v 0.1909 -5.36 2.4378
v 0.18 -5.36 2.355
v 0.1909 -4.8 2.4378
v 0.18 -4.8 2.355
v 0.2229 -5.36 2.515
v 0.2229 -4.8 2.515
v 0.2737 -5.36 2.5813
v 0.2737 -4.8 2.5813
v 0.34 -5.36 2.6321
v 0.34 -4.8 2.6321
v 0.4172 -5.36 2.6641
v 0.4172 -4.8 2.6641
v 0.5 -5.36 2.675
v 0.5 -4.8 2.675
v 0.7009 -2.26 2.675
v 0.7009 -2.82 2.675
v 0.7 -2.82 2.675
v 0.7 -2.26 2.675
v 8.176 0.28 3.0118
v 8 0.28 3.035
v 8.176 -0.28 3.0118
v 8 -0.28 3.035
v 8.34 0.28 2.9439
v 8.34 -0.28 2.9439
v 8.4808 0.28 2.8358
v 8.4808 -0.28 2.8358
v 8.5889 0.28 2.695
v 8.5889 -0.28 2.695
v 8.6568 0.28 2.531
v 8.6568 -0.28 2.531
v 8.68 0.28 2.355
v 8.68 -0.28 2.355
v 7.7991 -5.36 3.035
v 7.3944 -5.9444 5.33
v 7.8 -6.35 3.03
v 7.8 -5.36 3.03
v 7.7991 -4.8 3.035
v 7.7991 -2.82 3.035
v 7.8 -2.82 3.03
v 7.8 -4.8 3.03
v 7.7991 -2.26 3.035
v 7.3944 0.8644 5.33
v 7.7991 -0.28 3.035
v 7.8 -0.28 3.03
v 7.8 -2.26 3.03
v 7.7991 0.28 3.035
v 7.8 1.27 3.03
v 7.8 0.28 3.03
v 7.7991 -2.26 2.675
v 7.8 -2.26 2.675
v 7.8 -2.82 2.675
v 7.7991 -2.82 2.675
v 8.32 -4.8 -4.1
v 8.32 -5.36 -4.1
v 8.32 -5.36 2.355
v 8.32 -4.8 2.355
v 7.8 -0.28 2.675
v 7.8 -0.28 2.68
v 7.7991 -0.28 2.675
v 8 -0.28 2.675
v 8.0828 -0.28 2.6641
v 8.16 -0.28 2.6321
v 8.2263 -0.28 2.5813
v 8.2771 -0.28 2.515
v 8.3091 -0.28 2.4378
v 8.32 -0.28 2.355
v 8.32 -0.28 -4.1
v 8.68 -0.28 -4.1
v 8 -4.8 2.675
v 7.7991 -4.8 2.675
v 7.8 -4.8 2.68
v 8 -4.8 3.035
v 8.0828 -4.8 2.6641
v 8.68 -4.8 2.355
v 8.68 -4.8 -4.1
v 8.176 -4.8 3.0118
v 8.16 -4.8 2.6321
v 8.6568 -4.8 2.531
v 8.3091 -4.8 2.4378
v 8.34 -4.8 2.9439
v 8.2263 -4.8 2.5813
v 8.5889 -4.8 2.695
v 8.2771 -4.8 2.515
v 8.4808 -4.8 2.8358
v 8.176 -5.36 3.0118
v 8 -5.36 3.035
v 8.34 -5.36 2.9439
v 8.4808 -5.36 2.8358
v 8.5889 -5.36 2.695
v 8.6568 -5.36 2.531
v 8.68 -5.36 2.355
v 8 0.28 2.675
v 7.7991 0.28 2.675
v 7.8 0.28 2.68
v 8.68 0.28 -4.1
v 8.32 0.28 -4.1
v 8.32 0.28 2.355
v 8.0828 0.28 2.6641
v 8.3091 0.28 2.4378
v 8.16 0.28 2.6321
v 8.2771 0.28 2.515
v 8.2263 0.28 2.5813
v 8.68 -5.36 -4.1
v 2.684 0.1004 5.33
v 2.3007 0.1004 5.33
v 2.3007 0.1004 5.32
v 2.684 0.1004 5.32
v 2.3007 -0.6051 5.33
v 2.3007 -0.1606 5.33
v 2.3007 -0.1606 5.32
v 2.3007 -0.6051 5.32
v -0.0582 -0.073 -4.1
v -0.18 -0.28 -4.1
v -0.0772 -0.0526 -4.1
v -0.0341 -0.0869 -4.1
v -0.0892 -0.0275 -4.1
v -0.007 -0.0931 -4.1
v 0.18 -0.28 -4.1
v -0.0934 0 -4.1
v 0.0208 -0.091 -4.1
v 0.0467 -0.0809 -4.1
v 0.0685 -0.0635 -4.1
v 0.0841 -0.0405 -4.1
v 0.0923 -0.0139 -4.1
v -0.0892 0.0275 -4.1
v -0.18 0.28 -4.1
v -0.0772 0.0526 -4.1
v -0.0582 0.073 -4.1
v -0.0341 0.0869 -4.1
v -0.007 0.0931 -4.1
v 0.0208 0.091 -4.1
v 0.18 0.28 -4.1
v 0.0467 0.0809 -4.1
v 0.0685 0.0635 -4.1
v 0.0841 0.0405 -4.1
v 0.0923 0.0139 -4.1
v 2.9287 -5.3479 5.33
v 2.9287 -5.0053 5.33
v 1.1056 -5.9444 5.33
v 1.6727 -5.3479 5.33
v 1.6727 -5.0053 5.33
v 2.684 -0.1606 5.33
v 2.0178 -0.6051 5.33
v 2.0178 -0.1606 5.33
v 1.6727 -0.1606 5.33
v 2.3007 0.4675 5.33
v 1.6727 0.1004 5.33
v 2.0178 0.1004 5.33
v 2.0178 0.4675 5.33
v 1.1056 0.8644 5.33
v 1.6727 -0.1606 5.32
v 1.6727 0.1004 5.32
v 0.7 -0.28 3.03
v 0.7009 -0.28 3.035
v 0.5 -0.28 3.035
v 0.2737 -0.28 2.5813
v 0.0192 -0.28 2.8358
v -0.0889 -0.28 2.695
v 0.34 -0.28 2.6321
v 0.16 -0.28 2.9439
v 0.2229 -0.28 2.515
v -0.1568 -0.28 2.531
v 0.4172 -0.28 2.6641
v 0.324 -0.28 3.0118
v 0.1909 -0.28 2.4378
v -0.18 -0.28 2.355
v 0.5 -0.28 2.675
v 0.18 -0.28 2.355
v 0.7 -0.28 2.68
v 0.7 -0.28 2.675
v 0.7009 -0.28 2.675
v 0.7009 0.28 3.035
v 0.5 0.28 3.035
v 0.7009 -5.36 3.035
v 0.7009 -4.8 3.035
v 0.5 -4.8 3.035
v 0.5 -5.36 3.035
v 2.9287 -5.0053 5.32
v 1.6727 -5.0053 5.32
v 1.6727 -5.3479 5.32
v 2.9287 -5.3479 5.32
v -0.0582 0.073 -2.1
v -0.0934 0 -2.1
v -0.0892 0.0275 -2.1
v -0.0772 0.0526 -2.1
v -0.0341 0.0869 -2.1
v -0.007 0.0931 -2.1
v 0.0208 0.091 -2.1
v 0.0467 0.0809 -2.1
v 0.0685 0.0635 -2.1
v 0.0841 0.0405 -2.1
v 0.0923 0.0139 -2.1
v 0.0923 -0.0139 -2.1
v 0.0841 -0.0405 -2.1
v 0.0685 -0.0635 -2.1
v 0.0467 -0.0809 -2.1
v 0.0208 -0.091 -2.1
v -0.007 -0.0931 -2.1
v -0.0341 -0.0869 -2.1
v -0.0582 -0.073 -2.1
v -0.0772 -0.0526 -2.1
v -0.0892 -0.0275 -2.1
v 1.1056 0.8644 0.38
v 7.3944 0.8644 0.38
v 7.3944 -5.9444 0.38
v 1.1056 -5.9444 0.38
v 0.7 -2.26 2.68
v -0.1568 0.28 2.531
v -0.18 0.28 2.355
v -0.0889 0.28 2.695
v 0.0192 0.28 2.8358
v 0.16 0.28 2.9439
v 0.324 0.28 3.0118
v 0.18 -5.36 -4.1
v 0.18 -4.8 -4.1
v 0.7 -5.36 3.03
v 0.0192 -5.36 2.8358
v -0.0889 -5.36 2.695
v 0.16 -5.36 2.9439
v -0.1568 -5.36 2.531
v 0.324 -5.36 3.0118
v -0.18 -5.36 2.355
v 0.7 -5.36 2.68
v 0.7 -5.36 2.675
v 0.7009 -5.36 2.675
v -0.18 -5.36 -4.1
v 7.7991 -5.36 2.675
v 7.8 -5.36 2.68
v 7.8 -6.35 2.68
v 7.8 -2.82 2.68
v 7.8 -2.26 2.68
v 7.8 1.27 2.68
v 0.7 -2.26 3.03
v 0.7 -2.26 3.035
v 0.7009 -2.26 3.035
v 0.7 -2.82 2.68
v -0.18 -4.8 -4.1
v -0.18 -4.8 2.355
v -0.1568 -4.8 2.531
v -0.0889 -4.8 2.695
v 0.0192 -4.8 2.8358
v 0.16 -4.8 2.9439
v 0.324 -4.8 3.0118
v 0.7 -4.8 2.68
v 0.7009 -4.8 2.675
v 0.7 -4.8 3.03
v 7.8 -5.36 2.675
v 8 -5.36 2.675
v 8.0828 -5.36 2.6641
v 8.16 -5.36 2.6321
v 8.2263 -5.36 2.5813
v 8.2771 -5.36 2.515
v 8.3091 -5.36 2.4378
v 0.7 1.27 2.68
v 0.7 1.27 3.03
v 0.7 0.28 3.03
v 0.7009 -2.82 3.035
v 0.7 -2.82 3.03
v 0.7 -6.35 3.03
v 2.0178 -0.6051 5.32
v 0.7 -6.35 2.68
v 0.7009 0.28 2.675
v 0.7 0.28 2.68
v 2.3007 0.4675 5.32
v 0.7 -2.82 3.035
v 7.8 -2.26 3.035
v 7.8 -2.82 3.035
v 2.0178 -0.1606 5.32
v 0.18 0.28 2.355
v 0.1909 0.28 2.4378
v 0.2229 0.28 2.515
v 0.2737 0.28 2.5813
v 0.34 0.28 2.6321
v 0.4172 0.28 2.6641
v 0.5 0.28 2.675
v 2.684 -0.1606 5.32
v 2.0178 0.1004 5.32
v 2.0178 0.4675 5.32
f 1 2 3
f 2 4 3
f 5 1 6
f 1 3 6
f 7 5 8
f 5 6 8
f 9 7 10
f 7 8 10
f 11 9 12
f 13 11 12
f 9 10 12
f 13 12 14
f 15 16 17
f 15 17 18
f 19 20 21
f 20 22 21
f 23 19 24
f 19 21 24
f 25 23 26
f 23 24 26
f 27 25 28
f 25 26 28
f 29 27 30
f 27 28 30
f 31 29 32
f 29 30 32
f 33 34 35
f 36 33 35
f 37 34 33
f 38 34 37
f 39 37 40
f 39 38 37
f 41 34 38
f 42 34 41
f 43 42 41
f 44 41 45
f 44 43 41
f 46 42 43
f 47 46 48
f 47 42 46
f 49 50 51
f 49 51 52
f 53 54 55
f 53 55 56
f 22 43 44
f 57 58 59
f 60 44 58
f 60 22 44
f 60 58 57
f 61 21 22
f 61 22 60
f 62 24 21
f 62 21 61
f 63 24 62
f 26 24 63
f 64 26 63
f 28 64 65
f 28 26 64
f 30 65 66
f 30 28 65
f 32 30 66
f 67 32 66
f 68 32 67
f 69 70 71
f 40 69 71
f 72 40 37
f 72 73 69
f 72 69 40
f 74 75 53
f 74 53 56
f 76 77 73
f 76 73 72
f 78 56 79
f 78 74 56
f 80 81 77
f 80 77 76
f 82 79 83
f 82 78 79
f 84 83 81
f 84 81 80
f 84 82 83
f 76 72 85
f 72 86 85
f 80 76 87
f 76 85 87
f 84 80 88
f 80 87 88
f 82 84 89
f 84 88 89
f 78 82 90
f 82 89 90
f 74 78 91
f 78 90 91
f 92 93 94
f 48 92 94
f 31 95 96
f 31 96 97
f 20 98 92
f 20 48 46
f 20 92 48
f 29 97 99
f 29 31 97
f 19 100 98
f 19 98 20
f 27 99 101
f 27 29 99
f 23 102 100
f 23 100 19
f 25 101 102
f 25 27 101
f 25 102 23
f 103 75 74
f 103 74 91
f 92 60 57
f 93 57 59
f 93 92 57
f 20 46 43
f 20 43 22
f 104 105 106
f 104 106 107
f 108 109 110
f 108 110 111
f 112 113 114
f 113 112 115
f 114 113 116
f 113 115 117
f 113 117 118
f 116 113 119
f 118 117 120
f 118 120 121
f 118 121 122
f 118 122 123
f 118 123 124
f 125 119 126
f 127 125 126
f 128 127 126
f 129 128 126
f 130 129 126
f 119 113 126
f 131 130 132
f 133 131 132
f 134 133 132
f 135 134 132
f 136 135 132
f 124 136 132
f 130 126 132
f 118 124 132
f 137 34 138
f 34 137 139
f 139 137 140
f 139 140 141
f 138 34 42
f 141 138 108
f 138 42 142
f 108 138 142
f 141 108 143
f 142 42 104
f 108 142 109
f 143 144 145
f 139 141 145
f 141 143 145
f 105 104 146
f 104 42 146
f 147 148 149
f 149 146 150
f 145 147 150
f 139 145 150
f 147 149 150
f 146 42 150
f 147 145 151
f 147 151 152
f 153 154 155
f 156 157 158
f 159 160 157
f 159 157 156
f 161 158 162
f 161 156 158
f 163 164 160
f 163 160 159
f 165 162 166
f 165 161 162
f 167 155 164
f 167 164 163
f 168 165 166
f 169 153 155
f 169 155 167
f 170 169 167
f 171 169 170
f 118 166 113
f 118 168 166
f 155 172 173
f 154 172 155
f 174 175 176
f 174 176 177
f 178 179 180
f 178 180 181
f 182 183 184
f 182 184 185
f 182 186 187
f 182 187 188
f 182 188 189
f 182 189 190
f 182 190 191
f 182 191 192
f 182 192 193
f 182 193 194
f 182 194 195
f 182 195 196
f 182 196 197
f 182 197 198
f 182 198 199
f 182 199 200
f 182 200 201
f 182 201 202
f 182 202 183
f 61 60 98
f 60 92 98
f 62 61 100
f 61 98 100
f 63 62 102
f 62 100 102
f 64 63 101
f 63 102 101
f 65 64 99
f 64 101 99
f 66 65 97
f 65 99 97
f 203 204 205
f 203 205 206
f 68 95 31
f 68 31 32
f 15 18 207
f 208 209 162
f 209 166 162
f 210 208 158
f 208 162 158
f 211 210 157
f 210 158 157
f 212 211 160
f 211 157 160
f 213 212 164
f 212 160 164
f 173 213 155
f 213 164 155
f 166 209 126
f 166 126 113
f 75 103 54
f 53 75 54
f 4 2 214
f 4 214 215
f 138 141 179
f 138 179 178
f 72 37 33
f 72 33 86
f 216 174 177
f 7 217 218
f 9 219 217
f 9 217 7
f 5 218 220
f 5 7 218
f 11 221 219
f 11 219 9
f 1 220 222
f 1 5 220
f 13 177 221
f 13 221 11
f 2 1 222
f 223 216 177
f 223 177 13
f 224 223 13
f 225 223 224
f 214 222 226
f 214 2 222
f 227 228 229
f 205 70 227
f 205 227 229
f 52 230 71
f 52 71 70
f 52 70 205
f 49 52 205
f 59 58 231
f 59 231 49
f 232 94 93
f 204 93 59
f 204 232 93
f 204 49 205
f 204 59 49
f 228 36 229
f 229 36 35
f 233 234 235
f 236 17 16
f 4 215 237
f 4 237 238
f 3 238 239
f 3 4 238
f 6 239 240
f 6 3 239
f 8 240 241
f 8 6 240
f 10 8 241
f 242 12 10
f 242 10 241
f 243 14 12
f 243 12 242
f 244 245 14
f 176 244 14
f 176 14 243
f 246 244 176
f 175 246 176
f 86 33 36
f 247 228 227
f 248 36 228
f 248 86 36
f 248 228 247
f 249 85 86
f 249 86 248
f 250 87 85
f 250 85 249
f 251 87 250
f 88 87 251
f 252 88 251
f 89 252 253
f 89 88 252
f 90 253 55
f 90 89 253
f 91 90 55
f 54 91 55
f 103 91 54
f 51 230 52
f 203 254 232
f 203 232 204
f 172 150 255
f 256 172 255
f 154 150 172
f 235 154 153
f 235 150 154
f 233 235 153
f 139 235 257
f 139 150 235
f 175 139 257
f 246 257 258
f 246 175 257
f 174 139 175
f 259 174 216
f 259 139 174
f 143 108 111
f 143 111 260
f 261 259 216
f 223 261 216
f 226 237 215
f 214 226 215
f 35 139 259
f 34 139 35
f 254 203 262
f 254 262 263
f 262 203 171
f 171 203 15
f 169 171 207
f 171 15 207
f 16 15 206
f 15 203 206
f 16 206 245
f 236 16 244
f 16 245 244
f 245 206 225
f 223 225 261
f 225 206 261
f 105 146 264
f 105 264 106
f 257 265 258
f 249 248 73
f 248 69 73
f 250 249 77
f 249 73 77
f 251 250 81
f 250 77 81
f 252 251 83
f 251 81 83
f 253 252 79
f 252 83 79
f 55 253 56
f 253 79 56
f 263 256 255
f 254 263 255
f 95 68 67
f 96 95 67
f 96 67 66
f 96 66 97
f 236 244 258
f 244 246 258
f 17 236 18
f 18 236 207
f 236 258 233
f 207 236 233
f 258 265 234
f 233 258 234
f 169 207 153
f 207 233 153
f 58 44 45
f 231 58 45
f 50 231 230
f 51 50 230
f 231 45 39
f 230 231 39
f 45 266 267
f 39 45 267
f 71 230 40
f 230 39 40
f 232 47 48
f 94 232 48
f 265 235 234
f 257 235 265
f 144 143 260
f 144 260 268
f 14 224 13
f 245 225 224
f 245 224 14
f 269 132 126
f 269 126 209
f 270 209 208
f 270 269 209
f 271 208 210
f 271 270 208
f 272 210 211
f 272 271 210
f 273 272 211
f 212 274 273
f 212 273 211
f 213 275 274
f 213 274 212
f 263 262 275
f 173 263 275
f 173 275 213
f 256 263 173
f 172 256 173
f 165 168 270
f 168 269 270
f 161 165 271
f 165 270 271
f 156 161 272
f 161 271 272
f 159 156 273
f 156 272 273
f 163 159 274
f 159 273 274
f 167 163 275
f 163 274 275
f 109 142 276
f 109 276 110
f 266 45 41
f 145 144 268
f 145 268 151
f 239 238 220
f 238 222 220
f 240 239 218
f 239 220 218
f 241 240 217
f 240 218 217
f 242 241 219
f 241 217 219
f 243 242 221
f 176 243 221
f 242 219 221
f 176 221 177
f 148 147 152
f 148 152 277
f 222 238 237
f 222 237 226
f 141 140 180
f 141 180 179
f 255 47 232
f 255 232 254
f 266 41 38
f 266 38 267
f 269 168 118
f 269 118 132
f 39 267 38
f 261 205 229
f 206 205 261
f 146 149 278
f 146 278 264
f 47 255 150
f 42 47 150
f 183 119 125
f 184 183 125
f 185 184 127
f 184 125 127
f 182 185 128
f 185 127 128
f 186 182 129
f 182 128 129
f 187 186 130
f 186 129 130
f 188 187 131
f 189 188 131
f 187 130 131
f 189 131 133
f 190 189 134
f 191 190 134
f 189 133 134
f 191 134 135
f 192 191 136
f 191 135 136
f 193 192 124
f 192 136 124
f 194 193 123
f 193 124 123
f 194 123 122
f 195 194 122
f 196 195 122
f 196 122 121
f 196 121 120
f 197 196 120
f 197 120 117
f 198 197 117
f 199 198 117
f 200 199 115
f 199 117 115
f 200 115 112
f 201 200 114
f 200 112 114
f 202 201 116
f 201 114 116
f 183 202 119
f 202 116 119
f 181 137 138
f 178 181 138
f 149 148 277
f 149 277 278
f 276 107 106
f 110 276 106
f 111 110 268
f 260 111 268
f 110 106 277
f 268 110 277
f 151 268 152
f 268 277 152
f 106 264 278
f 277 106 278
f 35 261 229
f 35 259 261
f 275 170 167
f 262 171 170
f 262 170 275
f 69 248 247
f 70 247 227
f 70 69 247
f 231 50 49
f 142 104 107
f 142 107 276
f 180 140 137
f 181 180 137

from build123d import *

# Parameters (mm, degrees)
EXTRUDE_1_DEPTH     = 4.95
SKETCH_5_W          = 0.36
SKETCH_5_H          = 0.56
SKETCH_5_2_W        = 0.36
SKETCH_5_2_H        = 0.56
EXTRUDE_2_DEPTH     = 4.1
CHAMFER_1_SIZE      = 2.3
CHAMFER_1_SIZE_2    = 0.405552056
SKETCH_6_W          = 1.256035052
SKETCH_6_H          = 0.342555014
CUT_EXTRUDE_1_DEPTH = 0.01
SKETCH_7_W          = 10.556189846
SKETCH_7_H          = 3.652287582
CUT_EXTRUDE_2_DEPTH = 20
CHAMFER_2_SIZE      = 2.3
CHAMFER_2_SIZE2     = 0.405552056
SKETCH_8_W          = 1.558579466
SKETCH_8_H          = 2.253785059
SKETCH_8_W_2        = 1.350537768
SKETCH_8_H_2        = 2.346248035
CUT_EXTRUDE_3_DEPTH = 20
SKETCH_9_R          = 0.093378716
CUT_EXTRUDE_4_DEPTH = 2


with BuildPart() as part:
    # Эскиз3 → Вытянуть1 (new body)
    with BuildSketch(Plane.XY.offset(5.33)):
        Polygon((0.7, 1.27), (4.25, 1.27), (7.8, 1.27), (7.8, -8.89), (0.7, -8.89), align=None)
    extrude(amount=-EXTRUDE_1_DEPTH)

    # По траектории1: sweep along a path in Эскиз4
    with BuildLine(Plane(origin=(0, 0, 0), x_dir=(1, 0, 0), z_dir=(0, 1, 0))) as sweep_1_path:
        Line((0, 0), (0, -2.355))
        ThreePointArc((0, -2.355), (0.146446609, -2.708553391), (0.5, -2.855))
        Line((0.5, -2.855), (0.7, -2.855))
        Line((0.7, -2.855), (7.8, -2.855))
        Line((7.8, -2.855), (8, -2.855))
        ThreePointArc((8, -2.855), (8.353553391, -2.708553391), (8.5, -2.355))
        Line((8.5, -2.355), (8.5, 0))
        Line((8.5, 0), (8.5, 4.1))
    # Эскиз5 → По траектории1 (sweep)
    with BuildSketch(Plane.XY):
        with Locations((0, -2.54)):
            Rectangle(SKETCH_5_W, SKETCH_5_H)
        Rectangle(SKETCH_5_W, SKETCH_5_H)
        with Locations((0, -5.08)):
            Rectangle(SKETCH_5_W, SKETCH_5_H)
        with Locations((0, -7.62)):
            Rectangle(SKETCH_5_W, SKETCH_5_H)
    sweep(path=sweep_1_path.line)

    # Эскиз5<2> → Вытянуть2 (add)
    with BuildSketch(Plane.XY):
        with Locations((0, -2.54)):
            Rectangle(SKETCH_5_2_W, SKETCH_5_2_H)
        Rectangle(SKETCH_5_2_W, SKETCH_5_2_H)
        with Locations((0, -5.08)):
            Rectangle(SKETCH_5_2_W, SKETCH_5_2_H)
        with Locations((0, -7.62)):
            Rectangle(SKETCH_5_2_W, SKETCH_5_2_H)
    extrude(amount=-EXTRUDE_2_DEPTH)

    # Фаска1
    # the kernel refuses this chamfer: 2.3, 0.405552056 mm, written as the material it takes off along each edge
    with BuildSketch(Plane(origin=(13.776639232, -8.89, 0.38), x_dir=(0, -0.006682531656101655, 0.9999776716360548), z_dir=(-1, 0, 0))) as chamfer_1_piece_1:
        Polygon((CHAMFER_1_SIZE * 0.999977671636, CHAMFER_1_SIZE * 0.0066825316561), (-CHAMFER_1_SIZE_2 * 0.00668253165, CHAMFER_1_SIZE_2 * 0.999977670722), (0, 0), align=None)
    extrude(amount=19.053278464, mode=Mode.SUBTRACT)
    with BuildSketch(Plane(origin=(13.776639232, -8.89, 5.33), x_dir=(4.402885138150507e-15, 0.9776715712462588, 0.2101387607674306), z_dir=(-1, 0, 0))) as chamfer_1_piece_2:
        Polygon((CHAMFER_1_SIZE_2 * 0.977671570353, CHAMFER_1_SIZE_2 * 0.210138760575), (-CHAMFER_1_SIZE * 0.210138760767, CHAMFER_1_SIZE * 0.977671571246), (0, 0), align=None)
    extrude(amount=19.053278464, mode=Mode.SUBTRACT)
    with BuildSketch(Plane(origin=(7.8, 7.246639232, 0.38), x_dir=(0.006682531656101655, 0, 0.9999776716360548), z_dir=(0, -1, 0))) as chamfer_1_piece_3_section:
        Polygon((CHAMFER_1_SIZE * 0.999977671636, CHAMFER_1_SIZE * 0.0066825316561), (-CHAMFER_1_SIZE_2 * 0.00668253165, CHAMFER_1_SIZE_2 * 0.999977670722), (0, 0), align=None)
    chamfer_1_piece_3 = extrude(amount=22.113278464, mode=Mode.PRIVATE)
    chamfer_1_piece_3 = split(chamfer_1_piece_3, bisect_by=Plane(origin=(7.799706122, 0.28, 2.676666667), z_dir=(0, 1, 0)), keep=Keep.TOP, mode=Mode.PRIVATE)
    add(chamfer_1_piece_3, mode=Mode.SUBTRACT)
    with BuildSketch(Plane(origin=(7.8, 7.246639232, 0.38), x_dir=(0.006682531656101655, 0, 0.9999776716360548), z_dir=(0, -1, 0))) as chamfer_1_piece_4_section:
        Polygon((CHAMFER_1_SIZE * 0.999977671636, CHAMFER_1_SIZE * 0.0066825316561), (-CHAMFER_1_SIZE_2 * 0.00668253165, CHAMFER_1_SIZE_2 * 0.999977670722), (0, 0), align=None)
    chamfer_1_piece_4 = extrude(amount=22.113278464, mode=Mode.PRIVATE)
    chamfer_1_piece_4 = split(chamfer_1_piece_4, bisect_by=Plane(origin=(7.664815344, 0, 2.675), z_dir=(0, 0, -1)), keep=Keep.TOP, mode=Mode.PRIVATE)
    add(chamfer_1_piece_4, mode=Mode.SUBTRACT)
    with BuildSketch(Plane(origin=(7.8, 7.246639232, 0.38), x_dir=(0.006682531656101655, 0, 0.9999776716360548), z_dir=(0, -1, 0))) as chamfer_1_piece_5_section:
        Polygon((CHAMFER_1_SIZE * 0.999977671636, CHAMFER_1_SIZE * 0.0066825316561), (-CHAMFER_1_SIZE_2 * 0.00668253165, CHAMFER_1_SIZE_2 * 0.999977670722), (0, 0), align=None)
    chamfer_1_piece_5 = extrude(amount=22.113278464, mode=Mode.PRIVATE)
    chamfer_1_piece_5 = split(chamfer_1_piece_5, bisect_by=Plane(origin=(7.799706122, -2.26, 2.676666667), z_dir=(0, 1, 0)), keep=Keep.TOP, mode=Mode.PRIVATE)
    chamfer_1_piece_5 = split(chamfer_1_piece_5, bisect_by=Plane(origin=(7.799706122, -0.28, 2.676666667), z_dir=(0, -1, 0)), keep=Keep.TOP, mode=Mode.PRIVATE)
    add(chamfer_1_piece_5, mode=Mode.SUBTRACT)
    with BuildSketch(Plane(origin=(7.8, 7.246639232, 0.38), x_dir=(0.006682531656101655, 0, 0.9999776716360548), z_dir=(0, -1, 0))) as chamfer_1_piece_6_section:
        Polygon((CHAMFER_1_SIZE * 0.999977671636, CHAMFER_1_SIZE * 0.0066825316561), (-CHAMFER_1_SIZE_2 * 0.00668253165, CHAMFER_1_SIZE_2 * 0.999977670722), (0, 0), align=None)
    chamfer_1_piece_6 = extrude(amount=22.113278464, mode=Mode.PRIVATE)
    chamfer_1_piece_6 = split(chamfer_1_piece_6, bisect_by=Plane(origin=(7.799706122, -2.82, 2.676666667), z_dir=(0, -1, 0)), keep=Keep.TOP, mode=Mode.PRIVATE)
    chamfer_1_piece_6 = split(chamfer_1_piece_6, bisect_by=Plane(origin=(7.799706122, -4.8, 2.676666667), z_dir=(0, 1, 0)), keep=Keep.TOP, mode=Mode.PRIVATE)
    add(chamfer_1_piece_6, mode=Mode.SUBTRACT)
    with BuildSketch(Plane(origin=(7.8, 7.246639232, 0.38), x_dir=(0.006682531656101655, 0, 0.9999776716360548), z_dir=(0, -1, 0))) as chamfer_1_piece_7_section:
        Polygon((CHAMFER_1_SIZE * 0.999977671636, CHAMFER_1_SIZE * 0.0066825316561), (-CHAMFER_1_SIZE_2 * 0.00668253165, CHAMFER_1_SIZE_2 * 0.999977670722), (0, 0), align=None)
    chamfer_1_piece_7 = extrude(amount=22.113278464, mode=Mode.PRIVATE)
    chamfer_1_piece_7 = split(chamfer_1_piece_7, bisect_by=Plane(origin=(7.799706122, -7.34, 2.676666667), z_dir=(0, 1, 0)), keep=Keep.TOP, mode=Mode.PRIVATE)
    chamfer_1_piece_7 = split(chamfer_1_piece_7, bisect_by=Plane(origin=(7.799706122, -5.36, 2.676666667), z_dir=(0, -1, 0)), keep=Keep.TOP, mode=Mode.PRIVATE)
    add(chamfer_1_piece_7, mode=Mode.SUBTRACT)
    with BuildSketch(Plane(origin=(7.8, 7.246639232, 0.38), x_dir=(0.006682531656101655, 0, 0.9999776716360548), z_dir=(0, -1, 0))) as chamfer_1_piece_8_section:
        Polygon((CHAMFER_1_SIZE * 0.999977671636, CHAMFER_1_SIZE * 0.0066825316561), (-CHAMFER_1_SIZE_2 * 0.00668253165, CHAMFER_1_SIZE_2 * 0.999977670722), (0, 0), align=None)
    chamfer_1_piece_8 = extrude(amount=22.113278464, mode=Mode.PRIVATE)
    chamfer_1_piece_8 = split(chamfer_1_piece_8, bisect_by=Plane(origin=(7.799706122, -7.9, 2.676666667), z_dir=(0, -1, 0)), keep=Keep.TOP, mode=Mode.PRIVATE)
    add(chamfer_1_piece_8, mode=Mode.SUBTRACT)
    with BuildSketch(Plane(origin=(7.8, 7.246639232, 5.33), x_dir=(-0.9776715712462587, -1.3674752616302956e-15, 0.21013876076743102), z_dir=(0, -1, 0))) as chamfer_1_piece_9_section:
        Polygon((CHAMFER_1_SIZE_2 * 0.977671570353, CHAMFER_1_SIZE_2 * 0.210138760575), (-CHAMFER_1_SIZE * 0.210138760767, CHAMFER_1_SIZE * 0.977671571246), (0, 0), align=None)
    chamfer_1_piece_9 = extrude(amount=22.113278464, mode=Mode.PRIVATE)
    chamfer_1_piece_9 = split(chamfer_1_piece_9, bisect_by=Plane(origin=(7.664815344, 0.775, 3.035), z_dir=(0, 0, 1)), keep=Keep.TOP, mode=Mode.PRIVATE)
    add(chamfer_1_piece_9, mode=Mode.SUBTRACT)
    with BuildSketch(Plane(origin=(7.8, 7.246639232, 5.33), x_dir=(-0.9776715712462587, -1.3674752616302956e-15, 0.21013876076743102), z_dir=(0, -1, 0))) as chamfer_1_piece_10_section:
        Polygon((CHAMFER_1_SIZE_2 * 0.977671570353, CHAMFER_1_SIZE_2 * 0.210138760575), (-CHAMFER_1_SIZE * 0.210138760767, CHAMFER_1_SIZE * 0.977671571246), (0, 0), align=None)
    chamfer_1_piece_10 = extrude(amount=22.113278464, mode=Mode.PRIVATE)
    chamfer_1_piece_10 = split(chamfer_1_piece_10, bisect_by=Plane(origin=(7.799706122, 0.28, 3.033333333), z_dir=(0, 1, 0)), keep=Keep.TOP, mode=Mode.PRIVATE)
    add(chamfer_1_piece_10, mode=Mode.SUBTRACT)
    with BuildSketch(Plane(origin=(7.8, 7.246639232, 5.33), x_dir=(-0.9776715712462587, -1.3674752616302956e-15, 0.21013876076743102), z_dir=(0, -1, 0))) as chamfer_1_piece_11_section:
        Polygon((CHAMFER_1_SIZE_2 * 0.977671570353, CHAMFER_1_SIZE_2 * 0.210138760575), (-CHAMFER_1_SIZE * 0.210138760767, CHAMFER_1_SIZE * 0.977671571246), (0, 0), align=None)
    chamfer_1_piece_11 = extrude(amount=22.113278464, mode=Mode.PRIVATE)
    chamfer_1_piece_11 = split(chamfer_1_piece_11, bisect_by=Plane(origin=(7.799706122, -2.26, 3.033333333), z_dir=(0, 1, 0)), keep=Keep.TOP, mode=Mode.PRIVATE)
    chamfer_1_piece_11 = split(chamfer_1_piece_11, bisect_by=Plane(origin=(7.799706122, -0.28, 3.033333333), z_dir=(0, -1, 0)), keep=Keep.TOP, mode=Mode.PRIVATE)
    add(chamfer_1_piece_11, mode=Mode.SUBTRACT)
    with BuildSketch(Plane(origin=(7.8, 7.246639232, 5.33), x_dir=(-0.9776715712462587, -1.3674752616302956e-15, 0.21013876076743102), z_dir=(0, -1, 0))) as chamfer_1_piece_12_section:
        Polygon((CHAMFER_1_SIZE_2 * 0.977671570353, CHAMFER_1_SIZE_2 * 0.210138760575), (-CHAMFER_1_SIZE * 0.210138760767, CHAMFER_1_SIZE * 0.977671571246), (0, 0), align=None)
    chamfer_1_piece_12 = extrude(amount=22.113278464, mode=Mode.PRIVATE)
    chamfer_1_piece_12 = split(chamfer_1_piece_12, bisect_by=Plane(origin=(7.799706122, -2.82, 3.033333333), z_dir=(0, -1, 0)), keep=Keep.TOP, mode=Mode.PRIVATE)
    chamfer_1_piece_12 = split(chamfer_1_piece_12, bisect_by=Plane(origin=(7.799706122, -4.8, 3.033333333), z_dir=(0, 1, 0)), keep=Keep.TOP, mode=Mode.PRIVATE)
    add(chamfer_1_piece_12, mode=Mode.SUBTRACT)
    with BuildSketch(Plane(origin=(7.8, 7.246639232, 5.33), x_dir=(-0.9776715712462587, -1.3674752616302956e-15, 0.21013876076743102), z_dir=(0, -1, 0))) as chamfer_1_piece_13_section:
        Polygon((CHAMFER_1_SIZE_2 * 0.977671570353, CHAMFER_1_SIZE_2 * 0.210138760575), (-CHAMFER_1_SIZE * 0.210138760767, CHAMFER_1_SIZE * 0.977671571246), (0, 0), align=None)
    chamfer_1_piece_13 = extrude(amount=22.113278464, mode=Mode.PRIVATE)
    chamfer_1_piece_13 = split(chamfer_1_piece_13, bisect_by=Plane(origin=(7.799706122, -7.34, 3.033333333), z_dir=(0, 1, 0)), keep=Keep.TOP, mode=Mode.PRIVATE)
    chamfer_1_piece_13 = split(chamfer_1_piece_13, bisect_by=Plane(origin=(7.799706122, -5.36, 3.033333333), z_dir=(0, -1, 0)), keep=Keep.TOP, mode=Mode.PRIVATE)
    add(chamfer_1_piece_13, mode=Mode.SUBTRACT)
    with BuildSketch(Plane(origin=(7.8, 7.246639232, 5.33), x_dir=(-0.9776715712462587, -1.3674752616302956e-15, 0.21013876076743102), z_dir=(0, -1, 0))) as chamfer_1_piece_14_section:
        Polygon((CHAMFER_1_SIZE_2 * 0.977671570353, CHAMFER_1_SIZE_2 * 0.210138760575), (-CHAMFER_1_SIZE * 0.210138760767, CHAMFER_1_SIZE * 0.977671571246), (0, 0), align=None)
    chamfer_1_piece_14 = extrude(amount=22.113278464, mode=Mode.PRIVATE)
    chamfer_1_piece_14 = split(chamfer_1_piece_14, bisect_by=Plane(origin=(7.799706122, -7.9, 3.033333333), z_dir=(0, -1, 0)), keep=Keep.TOP, mode=Mode.PRIVATE)
    add(chamfer_1_piece_14, mode=Mode.SUBTRACT)
    with BuildSketch(Plane(origin=(13.776639232, 1.27, 0.38), x_dir=(0, 0.006682531656101748, 0.9999776716360548), z_dir=(-1, 0, 0)), Plane(origin=(-5.276639232, 1.27, 5.33), x_dir=(0, 0.006682531656101748, -0.9999776716360548), z_dir=(1, 0, 0))) as chamfer_1_piece_15:
        Polygon((CHAMFER_1_SIZE * 0.999977671636, -CHAMFER_1_SIZE * 0.0066825316561), (-CHAMFER_1_SIZE_2 * 0.00668253165, -CHAMFER_1_SIZE_2 * 0.999977670722), (0, 0), align=None)
    extrude(amount=19.053278464, mode=Mode.SUBTRACT)
    with BuildSketch(Plane(origin=(0.7, -14.866639232, 0.38), x_dir=(0.9776715712462587, 0, -0.2101387607674313), z_dir=(0, 1, 0))) as chamfer_1_piece_16_section:
        Polygon((CHAMFER_1_SIZE_2 * 0.977671570353, -CHAMFER_1_SIZE_2 * 0.210138760575), (-CHAMFER_1_SIZE * 0.210138760767, -CHAMFER_1_SIZE * 0.977671571246), (0, 0), align=None)
    chamfer_1_piece_16 = extrude(amount=22.113278464, mode=Mode.PRIVATE)
    chamfer_1_piece_16 = split(chamfer_1_piece_16, bisect_by=Plane(origin=(0.835184656, -8.395, 2.675), z_dir=(0, 0, -1)), keep=Keep.TOP, mode=Mode.PRIVATE)
    add(chamfer_1_piece_16, mode=Mode.SUBTRACT)
    with BuildSketch(Plane(origin=(0.7, -14.866639232, 0.38), x_dir=(0.9776715712462587, 0, -0.2101387607674313), z_dir=(0, 1, 0))) as chamfer_1_piece_17_section:
        Polygon((CHAMFER_1_SIZE_2 * 0.977671570353, -CHAMFER_1_SIZE_2 * 0.210138760575), (-CHAMFER_1_SIZE * 0.210138760767, -CHAMFER_1_SIZE * 0.977671571246), (0, 0), align=None)
    chamfer_1_piece_17 = extrude(amount=22.113278464, mode=Mode.PRIVATE)
    chamfer_1_piece_17 = split(chamfer_1_piece_17, bisect_by=Plane(origin=(0.700293878, -7.9, 2.676666667), z_dir=(0, -1, 0)), keep=Keep.TOP, mode=Mode.PRIVATE)
    add(chamfer_1_piece_17, mode=Mode.SUBTRACT)
    with BuildSketch(Plane(origin=(0.7, -14.866639232, 0.38), x_dir=(0.9776715712462587, 0, -0.2101387607674313), z_dir=(0, 1, 0))) as chamfer_1_piece_18_section:
        Polygon((CHAMFER_1_SIZE_2 * 0.977671570353, -CHAMFER_1_SIZE_2 * 0.210138760575), (-CHAMFER_1_SIZE * 0.210138760767, -CHAMFER_1_SIZE * 0.977671571246), (0, 0), align=None)
    chamfer_1_piece_18 = extrude(amount=22.113278464, mode=Mode.PRIVATE)
    chamfer_1_piece_18 = split(chamfer_1_piece_18, bisect_by=Plane(origin=(0.700293878, -5.36, 2.676666667), z_dir=(0, -1, 0)), keep=Keep.TOP, mode=Mode.PRIVATE)
    chamfer_1_piece_18 = split(chamfer_1_piece_18, bisect_by=Plane(origin=(0.700293878, -7.34, 2.676666667), z_dir=(0, 1, 0)), keep=Keep.TOP, mode=Mode.PRIVATE)
    add(chamfer_1_piece_18, mode=Mode.SUBTRACT)
    with BuildSketch(Plane(origin=(0.7, -14.866639232, 0.38), x_dir=(0.9776715712462587, 0, -0.2101387607674313), z_dir=(0, 1, 0))) as chamfer_1_piece_19_section:
        Polygon((CHAMFER_1_SIZE_2 * 0.977671570353, -CHAMFER_1_SIZE_2 * 0.210138760575), (-CHAMFER_1_SIZE * 0.210138760767, -CHAMFER_1_SIZE * 0.977671571246), (0, 0), align=None)
    chamfer_1_piece_19 = extrude(amount=22.113278464, mode=Mode.PRIVATE)
    chamfer_1_piece_19 = split(chamfer_1_piece_19, bisect_by=Plane(origin=(0.700293878, -2.82, 2.676666667), z_dir=(0, -1, 0)), keep=Keep.TOP, mode=Mode.PRIVATE)
    chamfer_1_piece_19 = split(chamfer_1_piece_19, bisect_by=Plane(origin=(0.700293878, -4.8, 2.676666667), z_dir=(0, 1, 0)), keep=Keep.TOP, mode=Mode.PRIVATE)
    add(chamfer_1_piece_19, mode=Mode.SUBTRACT)
    with BuildSketch(Plane(origin=(0.7, -14.866639232, 0.38), x_dir=(0.9776715712462587, 0, -0.2101387607674313), z_dir=(0, 1, 0))) as chamfer_1_piece_20_section:
        Polygon((CHAMFER_1_SIZE_2 * 0.977671570353, -CHAMFER_1_SIZE_2 * 0.210138760575), (-CHAMFER_1_SIZE * 0.210138760767, -CHAMFER_1_SIZE * 0.977671571246), (0, 0), align=None)
    chamfer_1_piece_20 = extrude(amount=22.113278464, mode=Mode.PRIVATE)
    chamfer_1_piece_20 = split(chamfer_1_piece_20, bisect_by=Plane(origin=(0.700293878, -0.28, 2.676666667), z_dir=(0, -1, 0)), keep=Keep.TOP, mode=Mode.PRIVATE)
    chamfer_1_piece_20 = split(chamfer_1_piece_20, bisect_by=Plane(origin=(0.700293878, -2.26, 2.676666667), z_dir=(0, 1, 0)), keep=Keep.TOP, mode=Mode.PRIVATE)
    add(chamfer_1_piece_20, mode=Mode.SUBTRACT)
    with BuildSketch(Plane(origin=(0.7, -14.866639232, 0.38), x_dir=(0.9776715712462587, 0, -0.2101387607674313), z_dir=(0, 1, 0))) as chamfer_1_piece_21_section:
        Polygon((CHAMFER_1_SIZE_2 * 0.977671570353, -CHAMFER_1_SIZE_2 * 0.210138760575), (-CHAMFER_1_SIZE * 0.210138760767, -CHAMFER_1_SIZE * 0.977671571246), (0, 0), align=None)
    chamfer_1_piece_21 = extrude(amount=22.113278464, mode=Mode.PRIVATE)
    chamfer_1_piece_21 = split(chamfer_1_piece_21, bisect_by=Plane(origin=(0.700293878, 0.28, 2.676666667), z_dir=(0, 1, 0)), keep=Keep.TOP, mode=Mode.PRIVATE)
    add(chamfer_1_piece_21, mode=Mode.SUBTRACT)
    with BuildSketch(Plane(origin=(0.7, -14.866639232, 5.33), x_dir=(0.9776715712462587, 0, 0.2101387607674309), z_dir=(0, 1, 0))) as chamfer_1_piece_22_section:
        Polygon((CHAMFER_1_SIZE_2 * 0.977671570353, CHAMFER_1_SIZE_2 * 0.210138760575), (-CHAMFER_1_SIZE * 0.210138760767, CHAMFER_1_SIZE * 0.977671571246), (0, 0), align=None)
    chamfer_1_piece_22 = extrude(amount=22.113278464, mode=Mode.PRIVATE)
    chamfer_1_piece_22 = split(chamfer_1_piece_22, bisect_by=Plane(origin=(0.835184656, -8.395, 3.035), z_dir=(0, 0, 1)), keep=Keep.TOP, mode=Mode.PRIVATE)
    add(chamfer_1_piece_22, mode=Mode.SUBTRACT)
    with BuildSketch(Plane(origin=(0.7, -14.866639232, 5.33), x_dir=(0.9776715712462587, 0, 0.2101387607674309), z_dir=(0, 1, 0))) as chamfer_1_piece_23_section:
        Polygon((CHAMFER_1_SIZE_2 * 0.977671570353, CHAMFER_1_SIZE_2 * 0.210138760575), (-CHAMFER_1_SIZE * 0.210138760767, CHAMFER_1_SIZE * 0.977671571246), (0, 0), align=None)
    chamfer_1_piece_23 = extrude(amount=22.113278464, mode=Mode.PRIVATE)
    chamfer_1_piece_23 = split(chamfer_1_piece_23, bisect_by=Plane(origin=(0.700293878, -7.9, 3.033333333), z_dir=(0, -1, 0)), keep=Keep.TOP, mode=Mode.PRIVATE)
    add(chamfer_1_piece_23, mode=Mode.SUBTRACT)
    with BuildSketch(Plane(origin=(0.7, -14.866639232, 5.33), x_dir=(0.9776715712462587, 0, 0.2101387607674309), z_dir=(0, 1, 0))) as chamfer_1_piece_24_section:
        Polygon((CHAMFER_1_SIZE_2 * 0.977671570353, CHAMFER_1_SIZE_2 * 0.210138760575), (-CHAMFER_1_SIZE * 0.210138760767, CHAMFER_1_SIZE * 0.977671571246), (0, 0), align=None)
    chamfer_1_piece_24 = extrude(amount=22.113278464, mode=Mode.PRIVATE)
    chamfer_1_piece_24 = split(chamfer_1_piece_24, bisect_by=Plane(origin=(0.700293878, -5.36, 3.033333333), z_dir=(0, -1, 0)), keep=Keep.TOP, mode=Mode.PRIVATE)
    chamfer_1_piece_24 = split(chamfer_1_piece_24, bisect_by=Plane(origin=(0.700293878, -7.34, 3.033333333), z_dir=(0, 1, 0)), keep=Keep.TOP, mode=Mode.PRIVATE)
    add(chamfer_1_piece_24, mode=Mode.SUBTRACT)
    with BuildSketch(Plane(origin=(0.7, -14.866639232, 5.33), x_dir=(0.9776715712462587, 0, 0.2101387607674309), z_dir=(0, 1, 0))) as chamfer_1_piece_25_section:
        Polygon((CHAMFER_1_SIZE_2 * 0.977671570353, CHAMFER_1_SIZE_2 * 0.210138760575), (-CHAMFER_1_SIZE * 0.210138760767, CHAMFER_1_SIZE * 0.977671571246), (0, 0), align=None)
    chamfer_1_piece_25 = extrude(amount=22.113278464, mode=Mode.PRIVATE)
    chamfer_1_piece_25 = split(chamfer_1_piece_25, bisect_by=Plane(origin=(0.700293878, -2.82, 3.033333333), z_dir=(0, -1, 0)), keep=Keep.TOP, mode=Mode.PRIVATE)
    chamfer_1_piece_25 = split(chamfer_1_piece_25, bisect_by=Plane(origin=(0.700293878, -4.8, 3.033333333), z_dir=(0, 1, 0)), keep=Keep.TOP, mode=Mode.PRIVATE)
    add(chamfer_1_piece_25, mode=Mode.SUBTRACT)
    with BuildSketch(Plane(origin=(0.7, -14.866639232, 5.33), x_dir=(0.9776715712462587, 0, 0.2101387607674309), z_dir=(0, 1, 0))) as chamfer_1_piece_26_section:
        Polygon((CHAMFER_1_SIZE_2 * 0.977671570353, CHAMFER_1_SIZE_2 * 0.210138760575), (-CHAMFER_1_SIZE * 0.210138760767, CHAMFER_1_SIZE * 0.977671571246), (0, 0), align=None)
    chamfer_1_piece_26 = extrude(amount=22.113278464, mode=Mode.PRIVATE)
    chamfer_1_piece_26 = split(chamfer_1_piece_26, bisect_by=Plane(origin=(0.700293878, -0.28, 3.033333333), z_dir=(0, -1, 0)), keep=Keep.TOP, mode=Mode.PRIVATE)
    chamfer_1_piece_26 = split(chamfer_1_piece_26, bisect_by=Plane(origin=(0.700293878, -2.26, 3.033333333), z_dir=(0, 1, 0)), keep=Keep.TOP, mode=Mode.PRIVATE)
    add(chamfer_1_piece_26, mode=Mode.SUBTRACT)
    with BuildSketch(Plane(origin=(0.7, -14.866639232, 5.33), x_dir=(0.9776715712462587, 0, 0.2101387607674309), z_dir=(0, 1, 0))) as chamfer_1_piece_27_section:
        Polygon((CHAMFER_1_SIZE_2 * 0.977671570353, CHAMFER_1_SIZE_2 * 0.210138760575), (-CHAMFER_1_SIZE * 0.210138760767, CHAMFER_1_SIZE * 0.977671571246), (0, 0), align=None)
    chamfer_1_piece_27 = extrude(amount=22.113278464, mode=Mode.PRIVATE)
    chamfer_1_piece_27 = split(chamfer_1_piece_27, bisect_by=Plane(origin=(0.700293878, 0.28, 3.033333333), z_dir=(0, 1, 0)), keep=Keep.TOP, mode=Mode.PRIVATE)
    add(chamfer_1_piece_27, mode=Mode.SUBTRACT)

    # Эскиз6 → Вырез-Вытянуть1 (cut)
    with BuildSketch(Plane.XY.offset(5.33)):
        Polygon((2.300698847, 0.100363767), (2.68403422, 0.100363767), (2.68403422, -0.16063053), (2.300698847, -0.16063053), (2.300698847, -0.605114081), (2.017762426, -0.605114081), (2.017762426, -0.16063053), (1.672681321, -0.16063053), (1.672681321, 0.100363767), (2.017762426, 0.100363767), (2.017762426, 0.467499156), (2.300698847, 0.467499156), align=None)
        with Locations((2.300698847, -5.176614669)):
            Rectangle(SKETCH_6_W, SKETCH_6_H)
    extrude(amount=-CUT_EXTRUDE_1_DEPTH, mode=Mode.SUBTRACT)

    # Эскиз7 → Вырез-Вытянуть2 (cut)
    with BuildSketch(Plane.XY.offset(5.33)):
        with Locations((4.103600287, -8.176143791)):
            Rectangle(SKETCH_7_W, SKETCH_7_H)
    extrude(amount=-CUT_EXTRUDE_2_DEPTH, mode=Mode.SUBTRACT)

    # Фаска2
    chamfer_2_edges = [part.edges().sort_by_distance(p)[0] for p in [
        (4.25, -6.35, 0.38),
        (4.25, -6.35, 5.33),
    ]]
    chamfer_2_side = [part.faces().sort_by_distance(p)[0] for p in [
        (4.25, -6.35, 2.855),
    ]]
    chamfer(chamfer_2_edges, length=CHAMFER_2_SIZE, length2=CHAMFER_2_SIZE2, reference=chamfer_2_side[0])

    # Эскиз8 → Вырез-Вытянуть3 (cut)
    with BuildSketch(Plane.XY.offset(5.33)):
        with Locations((8.579289733, -2.470652768)):
            Rectangle(SKETCH_8_W, SKETCH_8_H)
        with Locations((0.024731116, -2.516884255)):
            Rectangle(SKETCH_8_W_2, SKETCH_8_H_2)
    extrude(amount=-CUT_EXTRUDE_3_DEPTH, mode=Mode.SUBTRACT)

    # Эскиз9 → Вырез-Вытянуть4 (cut)
    with BuildSketch(Plane(origin=(0, 0, -4.1), x_dir=(-1, 0, 0), z_dir=(0, 0, -1))):
        Circle(SKETCH_9_R)
    extrude(amount=-CUT_EXTRUDE_4_DEPTH, mode=Mode.SUBTRACT)


solid = part.part
